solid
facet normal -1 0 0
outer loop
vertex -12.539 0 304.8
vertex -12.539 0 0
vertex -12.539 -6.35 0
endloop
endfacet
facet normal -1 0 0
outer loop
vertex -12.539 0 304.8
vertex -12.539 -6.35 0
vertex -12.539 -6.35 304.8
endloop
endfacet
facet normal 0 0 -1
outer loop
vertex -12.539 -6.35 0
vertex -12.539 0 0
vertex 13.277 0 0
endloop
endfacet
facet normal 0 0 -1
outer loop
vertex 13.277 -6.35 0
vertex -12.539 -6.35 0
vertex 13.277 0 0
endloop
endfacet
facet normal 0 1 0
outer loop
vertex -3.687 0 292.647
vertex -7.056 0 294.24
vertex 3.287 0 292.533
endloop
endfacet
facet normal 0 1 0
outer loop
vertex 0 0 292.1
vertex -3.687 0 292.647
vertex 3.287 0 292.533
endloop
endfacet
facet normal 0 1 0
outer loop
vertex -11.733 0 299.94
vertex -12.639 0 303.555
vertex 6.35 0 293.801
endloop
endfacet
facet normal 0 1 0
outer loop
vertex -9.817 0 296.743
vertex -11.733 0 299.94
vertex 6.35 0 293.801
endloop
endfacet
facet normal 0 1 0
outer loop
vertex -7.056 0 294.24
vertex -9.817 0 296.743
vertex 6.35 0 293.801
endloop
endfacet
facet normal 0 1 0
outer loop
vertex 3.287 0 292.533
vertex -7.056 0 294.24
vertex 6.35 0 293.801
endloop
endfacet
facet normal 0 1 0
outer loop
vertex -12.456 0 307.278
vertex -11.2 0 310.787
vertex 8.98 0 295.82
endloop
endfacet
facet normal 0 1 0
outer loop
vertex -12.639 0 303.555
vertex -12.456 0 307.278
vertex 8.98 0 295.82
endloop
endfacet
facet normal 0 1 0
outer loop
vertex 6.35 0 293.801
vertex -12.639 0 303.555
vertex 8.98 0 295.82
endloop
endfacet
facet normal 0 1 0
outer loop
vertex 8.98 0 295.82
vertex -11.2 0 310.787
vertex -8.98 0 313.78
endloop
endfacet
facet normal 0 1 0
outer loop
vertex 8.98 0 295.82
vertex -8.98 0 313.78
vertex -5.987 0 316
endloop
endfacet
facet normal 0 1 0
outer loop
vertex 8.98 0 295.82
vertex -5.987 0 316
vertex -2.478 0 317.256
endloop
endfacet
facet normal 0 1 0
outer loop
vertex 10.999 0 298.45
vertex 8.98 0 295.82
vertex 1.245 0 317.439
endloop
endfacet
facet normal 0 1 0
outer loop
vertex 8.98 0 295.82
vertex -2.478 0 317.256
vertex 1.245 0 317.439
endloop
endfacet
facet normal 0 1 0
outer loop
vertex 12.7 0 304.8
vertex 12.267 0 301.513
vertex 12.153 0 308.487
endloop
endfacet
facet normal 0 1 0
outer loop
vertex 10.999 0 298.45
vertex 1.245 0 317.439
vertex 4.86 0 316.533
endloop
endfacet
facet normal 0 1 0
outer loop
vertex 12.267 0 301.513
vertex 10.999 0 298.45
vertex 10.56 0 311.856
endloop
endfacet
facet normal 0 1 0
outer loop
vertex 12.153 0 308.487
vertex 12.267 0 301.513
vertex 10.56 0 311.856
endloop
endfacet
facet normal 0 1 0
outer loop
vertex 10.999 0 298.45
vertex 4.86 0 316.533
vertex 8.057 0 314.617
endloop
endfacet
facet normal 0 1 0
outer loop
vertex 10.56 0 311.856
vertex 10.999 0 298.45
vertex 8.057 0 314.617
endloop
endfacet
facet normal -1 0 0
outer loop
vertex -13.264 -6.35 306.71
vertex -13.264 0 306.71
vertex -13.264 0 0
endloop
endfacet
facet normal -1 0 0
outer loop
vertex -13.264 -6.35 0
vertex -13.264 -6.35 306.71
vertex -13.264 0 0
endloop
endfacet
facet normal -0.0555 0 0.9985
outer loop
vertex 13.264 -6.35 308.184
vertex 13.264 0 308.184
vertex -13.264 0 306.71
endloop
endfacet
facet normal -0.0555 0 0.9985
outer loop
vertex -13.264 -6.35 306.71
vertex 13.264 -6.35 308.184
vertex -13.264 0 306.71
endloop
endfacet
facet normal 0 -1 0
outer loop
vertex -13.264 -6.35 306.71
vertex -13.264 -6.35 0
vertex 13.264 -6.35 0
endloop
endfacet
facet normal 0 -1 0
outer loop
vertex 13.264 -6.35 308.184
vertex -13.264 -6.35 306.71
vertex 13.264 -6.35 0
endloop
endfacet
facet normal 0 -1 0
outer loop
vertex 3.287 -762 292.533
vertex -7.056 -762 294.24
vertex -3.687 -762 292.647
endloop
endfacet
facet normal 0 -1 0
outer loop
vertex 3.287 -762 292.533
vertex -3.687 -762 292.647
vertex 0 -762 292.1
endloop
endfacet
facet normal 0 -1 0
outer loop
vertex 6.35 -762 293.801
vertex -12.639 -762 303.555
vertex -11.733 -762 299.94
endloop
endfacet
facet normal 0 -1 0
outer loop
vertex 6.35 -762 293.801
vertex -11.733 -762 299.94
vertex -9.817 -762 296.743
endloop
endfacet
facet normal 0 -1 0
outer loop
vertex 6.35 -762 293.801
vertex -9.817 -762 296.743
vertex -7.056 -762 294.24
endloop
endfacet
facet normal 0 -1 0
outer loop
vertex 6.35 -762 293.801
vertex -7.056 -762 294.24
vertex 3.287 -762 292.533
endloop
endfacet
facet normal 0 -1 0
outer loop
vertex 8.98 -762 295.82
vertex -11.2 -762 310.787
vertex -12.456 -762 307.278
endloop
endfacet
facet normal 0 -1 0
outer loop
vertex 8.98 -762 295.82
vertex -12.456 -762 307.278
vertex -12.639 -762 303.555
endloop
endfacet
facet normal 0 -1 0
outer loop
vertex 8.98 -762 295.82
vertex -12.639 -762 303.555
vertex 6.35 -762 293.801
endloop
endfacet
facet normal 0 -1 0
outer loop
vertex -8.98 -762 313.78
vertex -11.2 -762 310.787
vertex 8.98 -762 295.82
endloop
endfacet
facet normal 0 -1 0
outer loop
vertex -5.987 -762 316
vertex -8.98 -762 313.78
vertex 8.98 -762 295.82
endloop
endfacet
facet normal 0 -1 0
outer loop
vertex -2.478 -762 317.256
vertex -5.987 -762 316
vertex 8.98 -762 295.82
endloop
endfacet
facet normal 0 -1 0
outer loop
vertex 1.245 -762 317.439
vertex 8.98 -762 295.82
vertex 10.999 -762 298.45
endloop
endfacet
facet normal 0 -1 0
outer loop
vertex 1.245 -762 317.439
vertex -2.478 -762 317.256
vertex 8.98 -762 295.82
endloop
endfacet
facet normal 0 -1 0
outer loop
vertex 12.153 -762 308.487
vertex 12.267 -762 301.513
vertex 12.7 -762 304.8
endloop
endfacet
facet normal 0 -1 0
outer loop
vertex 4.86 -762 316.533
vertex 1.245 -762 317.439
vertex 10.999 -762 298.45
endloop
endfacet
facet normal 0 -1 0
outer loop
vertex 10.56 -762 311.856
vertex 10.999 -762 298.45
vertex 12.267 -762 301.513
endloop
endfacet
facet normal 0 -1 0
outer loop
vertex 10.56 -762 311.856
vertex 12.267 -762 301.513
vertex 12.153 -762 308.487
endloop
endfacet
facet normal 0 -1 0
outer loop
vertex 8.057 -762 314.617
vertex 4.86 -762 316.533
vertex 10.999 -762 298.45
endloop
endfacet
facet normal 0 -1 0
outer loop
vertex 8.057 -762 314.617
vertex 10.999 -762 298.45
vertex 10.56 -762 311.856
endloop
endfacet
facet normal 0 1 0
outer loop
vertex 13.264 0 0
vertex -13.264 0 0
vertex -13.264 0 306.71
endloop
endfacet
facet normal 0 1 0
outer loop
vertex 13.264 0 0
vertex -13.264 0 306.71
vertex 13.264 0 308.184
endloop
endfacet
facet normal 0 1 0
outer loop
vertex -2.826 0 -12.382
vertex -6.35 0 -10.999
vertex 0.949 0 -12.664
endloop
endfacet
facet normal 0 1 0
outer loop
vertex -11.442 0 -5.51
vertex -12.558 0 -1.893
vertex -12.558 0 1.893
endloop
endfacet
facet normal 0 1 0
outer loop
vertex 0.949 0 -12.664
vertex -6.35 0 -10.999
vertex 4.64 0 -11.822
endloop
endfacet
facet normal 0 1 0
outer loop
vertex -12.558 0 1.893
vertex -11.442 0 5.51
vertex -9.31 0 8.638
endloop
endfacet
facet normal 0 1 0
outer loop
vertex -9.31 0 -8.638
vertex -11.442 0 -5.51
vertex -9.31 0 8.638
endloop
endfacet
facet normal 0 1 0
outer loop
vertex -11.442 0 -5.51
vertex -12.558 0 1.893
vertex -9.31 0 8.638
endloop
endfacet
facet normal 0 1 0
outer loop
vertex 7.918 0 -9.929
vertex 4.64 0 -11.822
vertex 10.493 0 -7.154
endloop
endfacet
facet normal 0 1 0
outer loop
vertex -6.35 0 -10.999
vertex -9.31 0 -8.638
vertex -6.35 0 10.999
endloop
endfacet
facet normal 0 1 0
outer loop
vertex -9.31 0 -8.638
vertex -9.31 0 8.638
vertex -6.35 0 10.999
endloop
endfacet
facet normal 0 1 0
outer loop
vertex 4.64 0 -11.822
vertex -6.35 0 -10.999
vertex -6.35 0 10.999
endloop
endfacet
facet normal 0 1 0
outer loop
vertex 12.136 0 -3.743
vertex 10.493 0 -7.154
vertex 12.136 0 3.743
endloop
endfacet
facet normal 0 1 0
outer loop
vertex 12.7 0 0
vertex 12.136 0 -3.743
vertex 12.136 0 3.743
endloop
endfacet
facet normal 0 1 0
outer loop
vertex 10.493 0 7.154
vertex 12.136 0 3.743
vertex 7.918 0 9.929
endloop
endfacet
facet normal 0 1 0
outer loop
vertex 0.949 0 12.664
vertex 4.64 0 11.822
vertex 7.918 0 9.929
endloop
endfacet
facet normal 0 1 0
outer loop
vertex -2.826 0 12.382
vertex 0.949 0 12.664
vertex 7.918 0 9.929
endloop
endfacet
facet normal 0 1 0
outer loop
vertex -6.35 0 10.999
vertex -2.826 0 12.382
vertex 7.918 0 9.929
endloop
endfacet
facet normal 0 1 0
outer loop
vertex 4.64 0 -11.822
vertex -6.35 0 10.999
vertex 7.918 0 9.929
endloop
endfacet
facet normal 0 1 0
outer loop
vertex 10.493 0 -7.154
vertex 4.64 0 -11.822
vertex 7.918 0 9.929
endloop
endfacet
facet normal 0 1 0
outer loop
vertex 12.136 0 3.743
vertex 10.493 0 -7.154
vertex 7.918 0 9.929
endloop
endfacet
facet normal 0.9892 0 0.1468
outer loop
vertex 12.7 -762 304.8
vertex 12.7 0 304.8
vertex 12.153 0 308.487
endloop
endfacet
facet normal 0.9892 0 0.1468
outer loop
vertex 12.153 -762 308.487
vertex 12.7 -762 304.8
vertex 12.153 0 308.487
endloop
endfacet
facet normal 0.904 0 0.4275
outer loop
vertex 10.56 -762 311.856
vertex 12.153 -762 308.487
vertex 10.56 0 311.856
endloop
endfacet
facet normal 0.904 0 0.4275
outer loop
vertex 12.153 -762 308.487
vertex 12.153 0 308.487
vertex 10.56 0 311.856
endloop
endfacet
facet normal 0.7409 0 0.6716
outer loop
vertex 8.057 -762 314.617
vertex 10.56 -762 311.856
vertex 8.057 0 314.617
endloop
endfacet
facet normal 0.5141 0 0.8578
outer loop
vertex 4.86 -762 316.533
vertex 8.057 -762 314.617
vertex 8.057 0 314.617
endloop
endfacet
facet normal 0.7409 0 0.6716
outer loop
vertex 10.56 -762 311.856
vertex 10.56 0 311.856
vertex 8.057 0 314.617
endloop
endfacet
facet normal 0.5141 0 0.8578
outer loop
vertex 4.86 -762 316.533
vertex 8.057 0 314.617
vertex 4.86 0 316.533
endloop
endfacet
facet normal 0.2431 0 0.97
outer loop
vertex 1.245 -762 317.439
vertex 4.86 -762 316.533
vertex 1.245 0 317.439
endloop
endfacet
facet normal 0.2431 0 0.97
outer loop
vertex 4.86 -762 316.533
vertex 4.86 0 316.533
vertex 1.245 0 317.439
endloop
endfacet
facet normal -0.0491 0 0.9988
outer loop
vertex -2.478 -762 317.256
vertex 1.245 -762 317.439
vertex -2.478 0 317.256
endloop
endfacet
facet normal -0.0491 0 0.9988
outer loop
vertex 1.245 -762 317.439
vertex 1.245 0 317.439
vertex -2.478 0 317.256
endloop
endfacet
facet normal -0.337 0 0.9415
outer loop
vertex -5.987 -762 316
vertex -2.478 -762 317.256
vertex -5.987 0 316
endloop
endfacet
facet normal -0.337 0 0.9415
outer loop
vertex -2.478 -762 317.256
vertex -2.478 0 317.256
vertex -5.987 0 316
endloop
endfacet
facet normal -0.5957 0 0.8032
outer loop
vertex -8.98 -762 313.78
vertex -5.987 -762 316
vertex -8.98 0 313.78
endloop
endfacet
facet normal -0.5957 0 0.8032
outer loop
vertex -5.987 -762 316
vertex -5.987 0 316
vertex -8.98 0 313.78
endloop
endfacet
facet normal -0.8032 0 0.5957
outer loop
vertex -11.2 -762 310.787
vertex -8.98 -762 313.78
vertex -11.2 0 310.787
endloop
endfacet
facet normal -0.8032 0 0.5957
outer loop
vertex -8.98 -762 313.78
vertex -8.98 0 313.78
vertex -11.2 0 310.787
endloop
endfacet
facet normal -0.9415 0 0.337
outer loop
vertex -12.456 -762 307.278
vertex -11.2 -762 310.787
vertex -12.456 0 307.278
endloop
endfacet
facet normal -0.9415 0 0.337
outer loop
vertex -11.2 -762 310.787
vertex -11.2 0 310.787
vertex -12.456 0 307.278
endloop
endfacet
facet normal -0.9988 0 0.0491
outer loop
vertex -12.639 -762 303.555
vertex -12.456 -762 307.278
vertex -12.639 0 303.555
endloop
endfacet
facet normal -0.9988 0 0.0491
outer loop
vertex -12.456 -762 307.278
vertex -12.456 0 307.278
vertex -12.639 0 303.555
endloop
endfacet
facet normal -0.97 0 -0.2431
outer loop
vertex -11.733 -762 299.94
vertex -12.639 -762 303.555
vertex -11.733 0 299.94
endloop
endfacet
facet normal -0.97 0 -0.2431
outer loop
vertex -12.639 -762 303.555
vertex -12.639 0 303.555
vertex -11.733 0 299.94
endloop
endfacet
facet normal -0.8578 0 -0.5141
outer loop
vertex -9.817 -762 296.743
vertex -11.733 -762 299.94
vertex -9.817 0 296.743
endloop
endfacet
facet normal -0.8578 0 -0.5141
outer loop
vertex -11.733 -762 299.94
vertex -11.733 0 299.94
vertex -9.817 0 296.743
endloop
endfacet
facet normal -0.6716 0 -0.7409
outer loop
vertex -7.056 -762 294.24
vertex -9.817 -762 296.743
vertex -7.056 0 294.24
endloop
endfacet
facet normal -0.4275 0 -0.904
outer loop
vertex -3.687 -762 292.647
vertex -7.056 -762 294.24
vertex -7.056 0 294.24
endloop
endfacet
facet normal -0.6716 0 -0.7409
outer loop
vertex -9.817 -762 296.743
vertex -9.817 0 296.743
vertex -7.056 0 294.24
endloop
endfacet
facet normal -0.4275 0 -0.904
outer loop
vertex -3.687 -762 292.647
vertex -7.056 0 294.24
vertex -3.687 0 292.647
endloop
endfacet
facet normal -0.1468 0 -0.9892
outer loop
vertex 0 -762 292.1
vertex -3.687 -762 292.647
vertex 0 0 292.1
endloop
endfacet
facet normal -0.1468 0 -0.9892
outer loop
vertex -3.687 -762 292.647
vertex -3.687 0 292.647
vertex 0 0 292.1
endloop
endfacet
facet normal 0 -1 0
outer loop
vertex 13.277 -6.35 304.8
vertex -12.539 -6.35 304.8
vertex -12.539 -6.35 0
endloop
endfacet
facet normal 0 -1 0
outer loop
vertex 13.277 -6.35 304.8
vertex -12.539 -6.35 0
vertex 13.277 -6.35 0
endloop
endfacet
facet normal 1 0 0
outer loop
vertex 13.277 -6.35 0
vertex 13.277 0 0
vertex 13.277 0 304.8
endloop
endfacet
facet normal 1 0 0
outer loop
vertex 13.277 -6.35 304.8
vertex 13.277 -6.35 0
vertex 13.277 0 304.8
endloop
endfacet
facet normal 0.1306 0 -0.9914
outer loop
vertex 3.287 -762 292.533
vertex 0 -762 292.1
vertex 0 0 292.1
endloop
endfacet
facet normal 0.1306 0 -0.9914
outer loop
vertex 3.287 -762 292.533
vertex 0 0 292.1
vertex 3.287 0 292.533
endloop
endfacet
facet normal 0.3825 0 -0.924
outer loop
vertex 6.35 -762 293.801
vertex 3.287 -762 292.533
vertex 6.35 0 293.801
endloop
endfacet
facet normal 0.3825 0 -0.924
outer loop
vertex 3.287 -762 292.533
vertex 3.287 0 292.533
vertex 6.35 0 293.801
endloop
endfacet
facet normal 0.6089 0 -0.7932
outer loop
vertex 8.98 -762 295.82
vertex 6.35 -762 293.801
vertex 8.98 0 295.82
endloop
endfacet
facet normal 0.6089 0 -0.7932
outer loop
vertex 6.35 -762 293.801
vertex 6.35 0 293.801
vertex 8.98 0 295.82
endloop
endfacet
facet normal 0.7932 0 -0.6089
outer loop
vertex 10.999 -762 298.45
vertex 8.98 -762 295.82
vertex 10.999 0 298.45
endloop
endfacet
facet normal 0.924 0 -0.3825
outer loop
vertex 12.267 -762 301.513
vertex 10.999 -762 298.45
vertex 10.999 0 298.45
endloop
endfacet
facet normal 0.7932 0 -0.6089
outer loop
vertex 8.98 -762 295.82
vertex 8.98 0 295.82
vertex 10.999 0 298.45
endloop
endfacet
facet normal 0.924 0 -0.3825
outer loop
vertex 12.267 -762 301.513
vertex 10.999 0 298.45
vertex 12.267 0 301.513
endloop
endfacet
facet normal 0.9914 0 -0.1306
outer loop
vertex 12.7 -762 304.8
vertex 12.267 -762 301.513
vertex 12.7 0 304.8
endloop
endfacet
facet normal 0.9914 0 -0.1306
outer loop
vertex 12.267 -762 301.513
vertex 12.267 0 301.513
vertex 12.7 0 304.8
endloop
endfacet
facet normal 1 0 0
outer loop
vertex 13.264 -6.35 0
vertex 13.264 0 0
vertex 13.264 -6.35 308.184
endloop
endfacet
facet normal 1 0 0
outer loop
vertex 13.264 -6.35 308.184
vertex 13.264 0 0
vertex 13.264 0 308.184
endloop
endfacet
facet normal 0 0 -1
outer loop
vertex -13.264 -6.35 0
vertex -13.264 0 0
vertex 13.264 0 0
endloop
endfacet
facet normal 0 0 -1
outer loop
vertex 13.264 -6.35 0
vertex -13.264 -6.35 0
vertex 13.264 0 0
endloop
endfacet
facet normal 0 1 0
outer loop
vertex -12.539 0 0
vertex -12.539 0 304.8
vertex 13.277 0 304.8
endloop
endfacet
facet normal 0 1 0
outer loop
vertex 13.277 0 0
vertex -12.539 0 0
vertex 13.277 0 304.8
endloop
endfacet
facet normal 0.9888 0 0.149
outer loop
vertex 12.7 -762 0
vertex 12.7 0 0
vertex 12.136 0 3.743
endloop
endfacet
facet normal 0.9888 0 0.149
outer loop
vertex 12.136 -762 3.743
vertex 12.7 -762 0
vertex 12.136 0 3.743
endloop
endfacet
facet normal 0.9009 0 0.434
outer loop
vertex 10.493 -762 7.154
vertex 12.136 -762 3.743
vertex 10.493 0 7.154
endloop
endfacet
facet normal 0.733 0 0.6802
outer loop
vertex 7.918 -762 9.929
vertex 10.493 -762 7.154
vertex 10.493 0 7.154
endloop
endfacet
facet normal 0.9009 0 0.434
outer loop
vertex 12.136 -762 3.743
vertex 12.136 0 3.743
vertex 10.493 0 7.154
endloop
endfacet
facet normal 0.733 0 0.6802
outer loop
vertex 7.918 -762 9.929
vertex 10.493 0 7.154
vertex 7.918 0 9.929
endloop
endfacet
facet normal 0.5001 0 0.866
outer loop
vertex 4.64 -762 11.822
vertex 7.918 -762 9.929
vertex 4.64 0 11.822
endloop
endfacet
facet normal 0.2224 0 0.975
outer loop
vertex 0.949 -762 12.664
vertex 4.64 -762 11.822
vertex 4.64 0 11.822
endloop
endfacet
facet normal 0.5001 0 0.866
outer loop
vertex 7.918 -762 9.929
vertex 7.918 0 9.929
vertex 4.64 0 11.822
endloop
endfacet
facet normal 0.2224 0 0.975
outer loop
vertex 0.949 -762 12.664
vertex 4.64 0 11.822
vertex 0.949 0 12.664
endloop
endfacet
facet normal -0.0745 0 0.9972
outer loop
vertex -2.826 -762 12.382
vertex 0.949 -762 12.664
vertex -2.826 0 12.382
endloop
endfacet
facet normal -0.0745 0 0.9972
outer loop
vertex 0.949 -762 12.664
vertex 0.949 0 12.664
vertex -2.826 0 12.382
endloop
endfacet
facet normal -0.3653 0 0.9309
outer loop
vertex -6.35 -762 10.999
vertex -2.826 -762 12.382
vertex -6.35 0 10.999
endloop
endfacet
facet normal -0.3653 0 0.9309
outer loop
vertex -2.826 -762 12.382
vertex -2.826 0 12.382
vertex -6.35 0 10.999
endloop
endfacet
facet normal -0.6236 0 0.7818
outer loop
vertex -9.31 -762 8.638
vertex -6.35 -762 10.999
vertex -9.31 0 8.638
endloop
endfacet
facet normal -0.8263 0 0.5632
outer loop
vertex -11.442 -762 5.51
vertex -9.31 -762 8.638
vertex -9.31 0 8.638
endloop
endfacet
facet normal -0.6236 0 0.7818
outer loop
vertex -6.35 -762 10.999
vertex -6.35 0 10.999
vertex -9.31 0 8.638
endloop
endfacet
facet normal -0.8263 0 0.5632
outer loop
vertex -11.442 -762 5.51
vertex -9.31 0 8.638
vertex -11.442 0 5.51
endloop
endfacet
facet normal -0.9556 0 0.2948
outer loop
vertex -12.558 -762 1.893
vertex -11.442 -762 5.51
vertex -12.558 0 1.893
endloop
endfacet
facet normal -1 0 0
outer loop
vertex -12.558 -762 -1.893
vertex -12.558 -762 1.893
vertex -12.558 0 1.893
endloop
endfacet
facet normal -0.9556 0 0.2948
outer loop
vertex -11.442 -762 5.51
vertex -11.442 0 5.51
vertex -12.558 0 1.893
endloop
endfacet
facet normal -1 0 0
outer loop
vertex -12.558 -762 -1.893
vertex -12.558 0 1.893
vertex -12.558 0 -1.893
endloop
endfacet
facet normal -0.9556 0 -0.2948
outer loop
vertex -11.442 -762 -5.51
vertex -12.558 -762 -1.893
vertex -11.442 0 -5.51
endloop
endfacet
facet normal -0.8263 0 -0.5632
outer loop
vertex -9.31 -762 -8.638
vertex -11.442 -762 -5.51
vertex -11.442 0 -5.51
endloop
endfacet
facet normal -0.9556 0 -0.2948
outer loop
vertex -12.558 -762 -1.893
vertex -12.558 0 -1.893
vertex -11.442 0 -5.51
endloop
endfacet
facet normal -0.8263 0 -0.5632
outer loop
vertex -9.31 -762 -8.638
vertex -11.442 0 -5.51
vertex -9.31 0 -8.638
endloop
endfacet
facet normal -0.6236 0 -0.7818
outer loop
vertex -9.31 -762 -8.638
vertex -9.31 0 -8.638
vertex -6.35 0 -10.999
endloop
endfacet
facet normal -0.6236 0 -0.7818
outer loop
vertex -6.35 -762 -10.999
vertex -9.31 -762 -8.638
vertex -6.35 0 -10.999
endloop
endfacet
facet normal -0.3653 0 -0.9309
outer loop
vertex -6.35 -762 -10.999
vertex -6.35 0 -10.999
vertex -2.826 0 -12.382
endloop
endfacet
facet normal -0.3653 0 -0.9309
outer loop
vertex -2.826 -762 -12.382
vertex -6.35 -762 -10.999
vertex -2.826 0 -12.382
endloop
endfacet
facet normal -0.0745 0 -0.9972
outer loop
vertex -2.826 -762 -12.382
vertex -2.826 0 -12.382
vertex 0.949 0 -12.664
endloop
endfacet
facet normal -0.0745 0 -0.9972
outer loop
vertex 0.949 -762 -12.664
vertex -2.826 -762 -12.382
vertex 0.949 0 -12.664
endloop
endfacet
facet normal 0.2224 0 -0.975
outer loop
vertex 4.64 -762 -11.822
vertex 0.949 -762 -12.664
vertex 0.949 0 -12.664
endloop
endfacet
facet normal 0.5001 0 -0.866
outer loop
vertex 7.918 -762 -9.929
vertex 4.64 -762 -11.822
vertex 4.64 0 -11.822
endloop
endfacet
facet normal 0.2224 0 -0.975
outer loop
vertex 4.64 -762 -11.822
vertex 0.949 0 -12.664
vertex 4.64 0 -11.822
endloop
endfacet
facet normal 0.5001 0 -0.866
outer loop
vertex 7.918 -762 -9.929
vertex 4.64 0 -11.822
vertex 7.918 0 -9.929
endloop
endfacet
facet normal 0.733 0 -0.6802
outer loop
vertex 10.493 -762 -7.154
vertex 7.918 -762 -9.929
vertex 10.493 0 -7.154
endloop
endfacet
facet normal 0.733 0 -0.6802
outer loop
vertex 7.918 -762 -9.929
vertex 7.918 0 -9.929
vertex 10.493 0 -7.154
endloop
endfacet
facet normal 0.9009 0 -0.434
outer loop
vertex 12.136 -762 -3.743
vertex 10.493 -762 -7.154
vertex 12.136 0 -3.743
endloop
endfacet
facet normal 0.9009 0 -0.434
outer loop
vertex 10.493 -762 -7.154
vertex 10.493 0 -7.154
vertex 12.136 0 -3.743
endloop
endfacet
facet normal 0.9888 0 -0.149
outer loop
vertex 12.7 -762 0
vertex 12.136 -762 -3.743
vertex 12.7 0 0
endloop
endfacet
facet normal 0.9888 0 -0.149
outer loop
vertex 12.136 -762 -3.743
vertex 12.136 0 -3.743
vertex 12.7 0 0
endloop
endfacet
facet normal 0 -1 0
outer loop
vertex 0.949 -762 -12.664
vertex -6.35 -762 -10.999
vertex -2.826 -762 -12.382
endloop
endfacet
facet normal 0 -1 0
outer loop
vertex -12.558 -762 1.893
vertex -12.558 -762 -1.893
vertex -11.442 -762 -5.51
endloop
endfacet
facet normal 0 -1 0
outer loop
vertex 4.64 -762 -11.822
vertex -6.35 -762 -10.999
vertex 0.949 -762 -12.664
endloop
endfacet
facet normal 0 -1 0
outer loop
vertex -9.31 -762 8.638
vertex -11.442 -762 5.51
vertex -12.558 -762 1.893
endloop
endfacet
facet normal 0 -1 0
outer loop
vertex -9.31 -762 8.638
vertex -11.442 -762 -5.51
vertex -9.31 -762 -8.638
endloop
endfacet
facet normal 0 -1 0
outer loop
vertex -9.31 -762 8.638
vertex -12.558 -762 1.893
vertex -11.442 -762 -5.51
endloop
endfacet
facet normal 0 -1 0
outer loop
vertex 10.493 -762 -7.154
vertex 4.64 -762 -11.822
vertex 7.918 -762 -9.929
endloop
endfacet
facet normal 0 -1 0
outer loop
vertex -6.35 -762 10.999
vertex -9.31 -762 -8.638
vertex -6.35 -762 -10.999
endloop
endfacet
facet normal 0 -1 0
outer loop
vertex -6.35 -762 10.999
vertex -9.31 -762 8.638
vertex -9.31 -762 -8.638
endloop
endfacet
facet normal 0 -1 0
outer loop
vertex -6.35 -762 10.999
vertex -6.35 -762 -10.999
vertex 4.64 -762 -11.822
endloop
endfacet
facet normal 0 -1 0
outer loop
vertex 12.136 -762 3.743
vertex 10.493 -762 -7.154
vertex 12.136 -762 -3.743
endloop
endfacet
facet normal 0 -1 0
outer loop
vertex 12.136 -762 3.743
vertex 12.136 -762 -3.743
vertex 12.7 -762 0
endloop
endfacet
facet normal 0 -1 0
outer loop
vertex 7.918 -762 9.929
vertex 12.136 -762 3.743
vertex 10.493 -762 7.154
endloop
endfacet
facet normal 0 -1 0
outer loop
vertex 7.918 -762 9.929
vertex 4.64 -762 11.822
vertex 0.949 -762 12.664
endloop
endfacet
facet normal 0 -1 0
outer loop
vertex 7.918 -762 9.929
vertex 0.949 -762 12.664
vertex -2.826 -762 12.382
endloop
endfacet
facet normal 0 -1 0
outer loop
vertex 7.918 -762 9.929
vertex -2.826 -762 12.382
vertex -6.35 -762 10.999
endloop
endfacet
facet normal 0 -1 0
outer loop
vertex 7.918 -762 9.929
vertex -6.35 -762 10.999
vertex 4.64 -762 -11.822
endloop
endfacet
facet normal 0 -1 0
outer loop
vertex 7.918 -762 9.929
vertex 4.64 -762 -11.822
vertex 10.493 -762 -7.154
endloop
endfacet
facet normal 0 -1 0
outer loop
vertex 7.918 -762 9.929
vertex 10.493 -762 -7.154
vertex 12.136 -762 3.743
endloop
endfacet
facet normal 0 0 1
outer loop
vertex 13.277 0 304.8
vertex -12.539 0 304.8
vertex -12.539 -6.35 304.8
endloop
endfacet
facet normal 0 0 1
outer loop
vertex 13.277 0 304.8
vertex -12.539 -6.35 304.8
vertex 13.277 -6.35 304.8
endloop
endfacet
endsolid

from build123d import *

# Parameters (mm, degrees)
F0_R     = 12.7
F1_DEPTH = 762
F3_DEPTH = 762
F4_W     = 25.81597
F4_H     = 304.8
F5_DEPTH = 6.35
F7_DEPTH = 6.35
F9_DEPTH = 6.35


with BuildPart() as f1:
    # F0 (on Front) → F1 (new body)
    with BuildSketch(Plane.XZ):
        Circle(F0_R)
    extrude(amount=F1_DEPTH)


with BuildPart() as f3:
    # F2 (on Front) → F3 (new body)
    with BuildSketch(Plane.XZ):
        with BuildLine():
            ThreePointArc((0, 292.1), (8.980256, 295.819744), (12.7, 304.8))
            ThreePointArc((12.7, 304.8), (-8.980256, 313.780256), (0, 292.1))
        make_face()
    extrude(amount=F3_DEPTH)


with BuildPart() as f5:
    # F4 (on Front) → F5 (new body)
    with BuildSketch(Plane.XZ):
        with Locations((0.368799, 152.4)):
            Rectangle(F4_W, F4_H)
    extrude(amount=F5_DEPTH)


with BuildPart() as f7:
    # F6 (on Front) → F7 (new body)
    with BuildSketch(Plane.XZ):
        Polygon((13.263695, 308.183849), (-13.263693, 306.710094), (-13.263693, 0), (13.263695, 0), align=None)
    extrude(amount=F7_DEPTH)


with BuildPart() as f9:
    # F8 (on face) → F9 (new body)
    with BuildSketch(Plane.XZ.offset(6.35)):
        Polygon((-247.386217, -295.513868), (-247.386217, 0), (-272.435516, 0), (-272.435516, -300.665438), align=None)
    extrude(amount=F9_DEPTH)


solid = Compound([f1.part, f3.part, f5.part, f7.part])
